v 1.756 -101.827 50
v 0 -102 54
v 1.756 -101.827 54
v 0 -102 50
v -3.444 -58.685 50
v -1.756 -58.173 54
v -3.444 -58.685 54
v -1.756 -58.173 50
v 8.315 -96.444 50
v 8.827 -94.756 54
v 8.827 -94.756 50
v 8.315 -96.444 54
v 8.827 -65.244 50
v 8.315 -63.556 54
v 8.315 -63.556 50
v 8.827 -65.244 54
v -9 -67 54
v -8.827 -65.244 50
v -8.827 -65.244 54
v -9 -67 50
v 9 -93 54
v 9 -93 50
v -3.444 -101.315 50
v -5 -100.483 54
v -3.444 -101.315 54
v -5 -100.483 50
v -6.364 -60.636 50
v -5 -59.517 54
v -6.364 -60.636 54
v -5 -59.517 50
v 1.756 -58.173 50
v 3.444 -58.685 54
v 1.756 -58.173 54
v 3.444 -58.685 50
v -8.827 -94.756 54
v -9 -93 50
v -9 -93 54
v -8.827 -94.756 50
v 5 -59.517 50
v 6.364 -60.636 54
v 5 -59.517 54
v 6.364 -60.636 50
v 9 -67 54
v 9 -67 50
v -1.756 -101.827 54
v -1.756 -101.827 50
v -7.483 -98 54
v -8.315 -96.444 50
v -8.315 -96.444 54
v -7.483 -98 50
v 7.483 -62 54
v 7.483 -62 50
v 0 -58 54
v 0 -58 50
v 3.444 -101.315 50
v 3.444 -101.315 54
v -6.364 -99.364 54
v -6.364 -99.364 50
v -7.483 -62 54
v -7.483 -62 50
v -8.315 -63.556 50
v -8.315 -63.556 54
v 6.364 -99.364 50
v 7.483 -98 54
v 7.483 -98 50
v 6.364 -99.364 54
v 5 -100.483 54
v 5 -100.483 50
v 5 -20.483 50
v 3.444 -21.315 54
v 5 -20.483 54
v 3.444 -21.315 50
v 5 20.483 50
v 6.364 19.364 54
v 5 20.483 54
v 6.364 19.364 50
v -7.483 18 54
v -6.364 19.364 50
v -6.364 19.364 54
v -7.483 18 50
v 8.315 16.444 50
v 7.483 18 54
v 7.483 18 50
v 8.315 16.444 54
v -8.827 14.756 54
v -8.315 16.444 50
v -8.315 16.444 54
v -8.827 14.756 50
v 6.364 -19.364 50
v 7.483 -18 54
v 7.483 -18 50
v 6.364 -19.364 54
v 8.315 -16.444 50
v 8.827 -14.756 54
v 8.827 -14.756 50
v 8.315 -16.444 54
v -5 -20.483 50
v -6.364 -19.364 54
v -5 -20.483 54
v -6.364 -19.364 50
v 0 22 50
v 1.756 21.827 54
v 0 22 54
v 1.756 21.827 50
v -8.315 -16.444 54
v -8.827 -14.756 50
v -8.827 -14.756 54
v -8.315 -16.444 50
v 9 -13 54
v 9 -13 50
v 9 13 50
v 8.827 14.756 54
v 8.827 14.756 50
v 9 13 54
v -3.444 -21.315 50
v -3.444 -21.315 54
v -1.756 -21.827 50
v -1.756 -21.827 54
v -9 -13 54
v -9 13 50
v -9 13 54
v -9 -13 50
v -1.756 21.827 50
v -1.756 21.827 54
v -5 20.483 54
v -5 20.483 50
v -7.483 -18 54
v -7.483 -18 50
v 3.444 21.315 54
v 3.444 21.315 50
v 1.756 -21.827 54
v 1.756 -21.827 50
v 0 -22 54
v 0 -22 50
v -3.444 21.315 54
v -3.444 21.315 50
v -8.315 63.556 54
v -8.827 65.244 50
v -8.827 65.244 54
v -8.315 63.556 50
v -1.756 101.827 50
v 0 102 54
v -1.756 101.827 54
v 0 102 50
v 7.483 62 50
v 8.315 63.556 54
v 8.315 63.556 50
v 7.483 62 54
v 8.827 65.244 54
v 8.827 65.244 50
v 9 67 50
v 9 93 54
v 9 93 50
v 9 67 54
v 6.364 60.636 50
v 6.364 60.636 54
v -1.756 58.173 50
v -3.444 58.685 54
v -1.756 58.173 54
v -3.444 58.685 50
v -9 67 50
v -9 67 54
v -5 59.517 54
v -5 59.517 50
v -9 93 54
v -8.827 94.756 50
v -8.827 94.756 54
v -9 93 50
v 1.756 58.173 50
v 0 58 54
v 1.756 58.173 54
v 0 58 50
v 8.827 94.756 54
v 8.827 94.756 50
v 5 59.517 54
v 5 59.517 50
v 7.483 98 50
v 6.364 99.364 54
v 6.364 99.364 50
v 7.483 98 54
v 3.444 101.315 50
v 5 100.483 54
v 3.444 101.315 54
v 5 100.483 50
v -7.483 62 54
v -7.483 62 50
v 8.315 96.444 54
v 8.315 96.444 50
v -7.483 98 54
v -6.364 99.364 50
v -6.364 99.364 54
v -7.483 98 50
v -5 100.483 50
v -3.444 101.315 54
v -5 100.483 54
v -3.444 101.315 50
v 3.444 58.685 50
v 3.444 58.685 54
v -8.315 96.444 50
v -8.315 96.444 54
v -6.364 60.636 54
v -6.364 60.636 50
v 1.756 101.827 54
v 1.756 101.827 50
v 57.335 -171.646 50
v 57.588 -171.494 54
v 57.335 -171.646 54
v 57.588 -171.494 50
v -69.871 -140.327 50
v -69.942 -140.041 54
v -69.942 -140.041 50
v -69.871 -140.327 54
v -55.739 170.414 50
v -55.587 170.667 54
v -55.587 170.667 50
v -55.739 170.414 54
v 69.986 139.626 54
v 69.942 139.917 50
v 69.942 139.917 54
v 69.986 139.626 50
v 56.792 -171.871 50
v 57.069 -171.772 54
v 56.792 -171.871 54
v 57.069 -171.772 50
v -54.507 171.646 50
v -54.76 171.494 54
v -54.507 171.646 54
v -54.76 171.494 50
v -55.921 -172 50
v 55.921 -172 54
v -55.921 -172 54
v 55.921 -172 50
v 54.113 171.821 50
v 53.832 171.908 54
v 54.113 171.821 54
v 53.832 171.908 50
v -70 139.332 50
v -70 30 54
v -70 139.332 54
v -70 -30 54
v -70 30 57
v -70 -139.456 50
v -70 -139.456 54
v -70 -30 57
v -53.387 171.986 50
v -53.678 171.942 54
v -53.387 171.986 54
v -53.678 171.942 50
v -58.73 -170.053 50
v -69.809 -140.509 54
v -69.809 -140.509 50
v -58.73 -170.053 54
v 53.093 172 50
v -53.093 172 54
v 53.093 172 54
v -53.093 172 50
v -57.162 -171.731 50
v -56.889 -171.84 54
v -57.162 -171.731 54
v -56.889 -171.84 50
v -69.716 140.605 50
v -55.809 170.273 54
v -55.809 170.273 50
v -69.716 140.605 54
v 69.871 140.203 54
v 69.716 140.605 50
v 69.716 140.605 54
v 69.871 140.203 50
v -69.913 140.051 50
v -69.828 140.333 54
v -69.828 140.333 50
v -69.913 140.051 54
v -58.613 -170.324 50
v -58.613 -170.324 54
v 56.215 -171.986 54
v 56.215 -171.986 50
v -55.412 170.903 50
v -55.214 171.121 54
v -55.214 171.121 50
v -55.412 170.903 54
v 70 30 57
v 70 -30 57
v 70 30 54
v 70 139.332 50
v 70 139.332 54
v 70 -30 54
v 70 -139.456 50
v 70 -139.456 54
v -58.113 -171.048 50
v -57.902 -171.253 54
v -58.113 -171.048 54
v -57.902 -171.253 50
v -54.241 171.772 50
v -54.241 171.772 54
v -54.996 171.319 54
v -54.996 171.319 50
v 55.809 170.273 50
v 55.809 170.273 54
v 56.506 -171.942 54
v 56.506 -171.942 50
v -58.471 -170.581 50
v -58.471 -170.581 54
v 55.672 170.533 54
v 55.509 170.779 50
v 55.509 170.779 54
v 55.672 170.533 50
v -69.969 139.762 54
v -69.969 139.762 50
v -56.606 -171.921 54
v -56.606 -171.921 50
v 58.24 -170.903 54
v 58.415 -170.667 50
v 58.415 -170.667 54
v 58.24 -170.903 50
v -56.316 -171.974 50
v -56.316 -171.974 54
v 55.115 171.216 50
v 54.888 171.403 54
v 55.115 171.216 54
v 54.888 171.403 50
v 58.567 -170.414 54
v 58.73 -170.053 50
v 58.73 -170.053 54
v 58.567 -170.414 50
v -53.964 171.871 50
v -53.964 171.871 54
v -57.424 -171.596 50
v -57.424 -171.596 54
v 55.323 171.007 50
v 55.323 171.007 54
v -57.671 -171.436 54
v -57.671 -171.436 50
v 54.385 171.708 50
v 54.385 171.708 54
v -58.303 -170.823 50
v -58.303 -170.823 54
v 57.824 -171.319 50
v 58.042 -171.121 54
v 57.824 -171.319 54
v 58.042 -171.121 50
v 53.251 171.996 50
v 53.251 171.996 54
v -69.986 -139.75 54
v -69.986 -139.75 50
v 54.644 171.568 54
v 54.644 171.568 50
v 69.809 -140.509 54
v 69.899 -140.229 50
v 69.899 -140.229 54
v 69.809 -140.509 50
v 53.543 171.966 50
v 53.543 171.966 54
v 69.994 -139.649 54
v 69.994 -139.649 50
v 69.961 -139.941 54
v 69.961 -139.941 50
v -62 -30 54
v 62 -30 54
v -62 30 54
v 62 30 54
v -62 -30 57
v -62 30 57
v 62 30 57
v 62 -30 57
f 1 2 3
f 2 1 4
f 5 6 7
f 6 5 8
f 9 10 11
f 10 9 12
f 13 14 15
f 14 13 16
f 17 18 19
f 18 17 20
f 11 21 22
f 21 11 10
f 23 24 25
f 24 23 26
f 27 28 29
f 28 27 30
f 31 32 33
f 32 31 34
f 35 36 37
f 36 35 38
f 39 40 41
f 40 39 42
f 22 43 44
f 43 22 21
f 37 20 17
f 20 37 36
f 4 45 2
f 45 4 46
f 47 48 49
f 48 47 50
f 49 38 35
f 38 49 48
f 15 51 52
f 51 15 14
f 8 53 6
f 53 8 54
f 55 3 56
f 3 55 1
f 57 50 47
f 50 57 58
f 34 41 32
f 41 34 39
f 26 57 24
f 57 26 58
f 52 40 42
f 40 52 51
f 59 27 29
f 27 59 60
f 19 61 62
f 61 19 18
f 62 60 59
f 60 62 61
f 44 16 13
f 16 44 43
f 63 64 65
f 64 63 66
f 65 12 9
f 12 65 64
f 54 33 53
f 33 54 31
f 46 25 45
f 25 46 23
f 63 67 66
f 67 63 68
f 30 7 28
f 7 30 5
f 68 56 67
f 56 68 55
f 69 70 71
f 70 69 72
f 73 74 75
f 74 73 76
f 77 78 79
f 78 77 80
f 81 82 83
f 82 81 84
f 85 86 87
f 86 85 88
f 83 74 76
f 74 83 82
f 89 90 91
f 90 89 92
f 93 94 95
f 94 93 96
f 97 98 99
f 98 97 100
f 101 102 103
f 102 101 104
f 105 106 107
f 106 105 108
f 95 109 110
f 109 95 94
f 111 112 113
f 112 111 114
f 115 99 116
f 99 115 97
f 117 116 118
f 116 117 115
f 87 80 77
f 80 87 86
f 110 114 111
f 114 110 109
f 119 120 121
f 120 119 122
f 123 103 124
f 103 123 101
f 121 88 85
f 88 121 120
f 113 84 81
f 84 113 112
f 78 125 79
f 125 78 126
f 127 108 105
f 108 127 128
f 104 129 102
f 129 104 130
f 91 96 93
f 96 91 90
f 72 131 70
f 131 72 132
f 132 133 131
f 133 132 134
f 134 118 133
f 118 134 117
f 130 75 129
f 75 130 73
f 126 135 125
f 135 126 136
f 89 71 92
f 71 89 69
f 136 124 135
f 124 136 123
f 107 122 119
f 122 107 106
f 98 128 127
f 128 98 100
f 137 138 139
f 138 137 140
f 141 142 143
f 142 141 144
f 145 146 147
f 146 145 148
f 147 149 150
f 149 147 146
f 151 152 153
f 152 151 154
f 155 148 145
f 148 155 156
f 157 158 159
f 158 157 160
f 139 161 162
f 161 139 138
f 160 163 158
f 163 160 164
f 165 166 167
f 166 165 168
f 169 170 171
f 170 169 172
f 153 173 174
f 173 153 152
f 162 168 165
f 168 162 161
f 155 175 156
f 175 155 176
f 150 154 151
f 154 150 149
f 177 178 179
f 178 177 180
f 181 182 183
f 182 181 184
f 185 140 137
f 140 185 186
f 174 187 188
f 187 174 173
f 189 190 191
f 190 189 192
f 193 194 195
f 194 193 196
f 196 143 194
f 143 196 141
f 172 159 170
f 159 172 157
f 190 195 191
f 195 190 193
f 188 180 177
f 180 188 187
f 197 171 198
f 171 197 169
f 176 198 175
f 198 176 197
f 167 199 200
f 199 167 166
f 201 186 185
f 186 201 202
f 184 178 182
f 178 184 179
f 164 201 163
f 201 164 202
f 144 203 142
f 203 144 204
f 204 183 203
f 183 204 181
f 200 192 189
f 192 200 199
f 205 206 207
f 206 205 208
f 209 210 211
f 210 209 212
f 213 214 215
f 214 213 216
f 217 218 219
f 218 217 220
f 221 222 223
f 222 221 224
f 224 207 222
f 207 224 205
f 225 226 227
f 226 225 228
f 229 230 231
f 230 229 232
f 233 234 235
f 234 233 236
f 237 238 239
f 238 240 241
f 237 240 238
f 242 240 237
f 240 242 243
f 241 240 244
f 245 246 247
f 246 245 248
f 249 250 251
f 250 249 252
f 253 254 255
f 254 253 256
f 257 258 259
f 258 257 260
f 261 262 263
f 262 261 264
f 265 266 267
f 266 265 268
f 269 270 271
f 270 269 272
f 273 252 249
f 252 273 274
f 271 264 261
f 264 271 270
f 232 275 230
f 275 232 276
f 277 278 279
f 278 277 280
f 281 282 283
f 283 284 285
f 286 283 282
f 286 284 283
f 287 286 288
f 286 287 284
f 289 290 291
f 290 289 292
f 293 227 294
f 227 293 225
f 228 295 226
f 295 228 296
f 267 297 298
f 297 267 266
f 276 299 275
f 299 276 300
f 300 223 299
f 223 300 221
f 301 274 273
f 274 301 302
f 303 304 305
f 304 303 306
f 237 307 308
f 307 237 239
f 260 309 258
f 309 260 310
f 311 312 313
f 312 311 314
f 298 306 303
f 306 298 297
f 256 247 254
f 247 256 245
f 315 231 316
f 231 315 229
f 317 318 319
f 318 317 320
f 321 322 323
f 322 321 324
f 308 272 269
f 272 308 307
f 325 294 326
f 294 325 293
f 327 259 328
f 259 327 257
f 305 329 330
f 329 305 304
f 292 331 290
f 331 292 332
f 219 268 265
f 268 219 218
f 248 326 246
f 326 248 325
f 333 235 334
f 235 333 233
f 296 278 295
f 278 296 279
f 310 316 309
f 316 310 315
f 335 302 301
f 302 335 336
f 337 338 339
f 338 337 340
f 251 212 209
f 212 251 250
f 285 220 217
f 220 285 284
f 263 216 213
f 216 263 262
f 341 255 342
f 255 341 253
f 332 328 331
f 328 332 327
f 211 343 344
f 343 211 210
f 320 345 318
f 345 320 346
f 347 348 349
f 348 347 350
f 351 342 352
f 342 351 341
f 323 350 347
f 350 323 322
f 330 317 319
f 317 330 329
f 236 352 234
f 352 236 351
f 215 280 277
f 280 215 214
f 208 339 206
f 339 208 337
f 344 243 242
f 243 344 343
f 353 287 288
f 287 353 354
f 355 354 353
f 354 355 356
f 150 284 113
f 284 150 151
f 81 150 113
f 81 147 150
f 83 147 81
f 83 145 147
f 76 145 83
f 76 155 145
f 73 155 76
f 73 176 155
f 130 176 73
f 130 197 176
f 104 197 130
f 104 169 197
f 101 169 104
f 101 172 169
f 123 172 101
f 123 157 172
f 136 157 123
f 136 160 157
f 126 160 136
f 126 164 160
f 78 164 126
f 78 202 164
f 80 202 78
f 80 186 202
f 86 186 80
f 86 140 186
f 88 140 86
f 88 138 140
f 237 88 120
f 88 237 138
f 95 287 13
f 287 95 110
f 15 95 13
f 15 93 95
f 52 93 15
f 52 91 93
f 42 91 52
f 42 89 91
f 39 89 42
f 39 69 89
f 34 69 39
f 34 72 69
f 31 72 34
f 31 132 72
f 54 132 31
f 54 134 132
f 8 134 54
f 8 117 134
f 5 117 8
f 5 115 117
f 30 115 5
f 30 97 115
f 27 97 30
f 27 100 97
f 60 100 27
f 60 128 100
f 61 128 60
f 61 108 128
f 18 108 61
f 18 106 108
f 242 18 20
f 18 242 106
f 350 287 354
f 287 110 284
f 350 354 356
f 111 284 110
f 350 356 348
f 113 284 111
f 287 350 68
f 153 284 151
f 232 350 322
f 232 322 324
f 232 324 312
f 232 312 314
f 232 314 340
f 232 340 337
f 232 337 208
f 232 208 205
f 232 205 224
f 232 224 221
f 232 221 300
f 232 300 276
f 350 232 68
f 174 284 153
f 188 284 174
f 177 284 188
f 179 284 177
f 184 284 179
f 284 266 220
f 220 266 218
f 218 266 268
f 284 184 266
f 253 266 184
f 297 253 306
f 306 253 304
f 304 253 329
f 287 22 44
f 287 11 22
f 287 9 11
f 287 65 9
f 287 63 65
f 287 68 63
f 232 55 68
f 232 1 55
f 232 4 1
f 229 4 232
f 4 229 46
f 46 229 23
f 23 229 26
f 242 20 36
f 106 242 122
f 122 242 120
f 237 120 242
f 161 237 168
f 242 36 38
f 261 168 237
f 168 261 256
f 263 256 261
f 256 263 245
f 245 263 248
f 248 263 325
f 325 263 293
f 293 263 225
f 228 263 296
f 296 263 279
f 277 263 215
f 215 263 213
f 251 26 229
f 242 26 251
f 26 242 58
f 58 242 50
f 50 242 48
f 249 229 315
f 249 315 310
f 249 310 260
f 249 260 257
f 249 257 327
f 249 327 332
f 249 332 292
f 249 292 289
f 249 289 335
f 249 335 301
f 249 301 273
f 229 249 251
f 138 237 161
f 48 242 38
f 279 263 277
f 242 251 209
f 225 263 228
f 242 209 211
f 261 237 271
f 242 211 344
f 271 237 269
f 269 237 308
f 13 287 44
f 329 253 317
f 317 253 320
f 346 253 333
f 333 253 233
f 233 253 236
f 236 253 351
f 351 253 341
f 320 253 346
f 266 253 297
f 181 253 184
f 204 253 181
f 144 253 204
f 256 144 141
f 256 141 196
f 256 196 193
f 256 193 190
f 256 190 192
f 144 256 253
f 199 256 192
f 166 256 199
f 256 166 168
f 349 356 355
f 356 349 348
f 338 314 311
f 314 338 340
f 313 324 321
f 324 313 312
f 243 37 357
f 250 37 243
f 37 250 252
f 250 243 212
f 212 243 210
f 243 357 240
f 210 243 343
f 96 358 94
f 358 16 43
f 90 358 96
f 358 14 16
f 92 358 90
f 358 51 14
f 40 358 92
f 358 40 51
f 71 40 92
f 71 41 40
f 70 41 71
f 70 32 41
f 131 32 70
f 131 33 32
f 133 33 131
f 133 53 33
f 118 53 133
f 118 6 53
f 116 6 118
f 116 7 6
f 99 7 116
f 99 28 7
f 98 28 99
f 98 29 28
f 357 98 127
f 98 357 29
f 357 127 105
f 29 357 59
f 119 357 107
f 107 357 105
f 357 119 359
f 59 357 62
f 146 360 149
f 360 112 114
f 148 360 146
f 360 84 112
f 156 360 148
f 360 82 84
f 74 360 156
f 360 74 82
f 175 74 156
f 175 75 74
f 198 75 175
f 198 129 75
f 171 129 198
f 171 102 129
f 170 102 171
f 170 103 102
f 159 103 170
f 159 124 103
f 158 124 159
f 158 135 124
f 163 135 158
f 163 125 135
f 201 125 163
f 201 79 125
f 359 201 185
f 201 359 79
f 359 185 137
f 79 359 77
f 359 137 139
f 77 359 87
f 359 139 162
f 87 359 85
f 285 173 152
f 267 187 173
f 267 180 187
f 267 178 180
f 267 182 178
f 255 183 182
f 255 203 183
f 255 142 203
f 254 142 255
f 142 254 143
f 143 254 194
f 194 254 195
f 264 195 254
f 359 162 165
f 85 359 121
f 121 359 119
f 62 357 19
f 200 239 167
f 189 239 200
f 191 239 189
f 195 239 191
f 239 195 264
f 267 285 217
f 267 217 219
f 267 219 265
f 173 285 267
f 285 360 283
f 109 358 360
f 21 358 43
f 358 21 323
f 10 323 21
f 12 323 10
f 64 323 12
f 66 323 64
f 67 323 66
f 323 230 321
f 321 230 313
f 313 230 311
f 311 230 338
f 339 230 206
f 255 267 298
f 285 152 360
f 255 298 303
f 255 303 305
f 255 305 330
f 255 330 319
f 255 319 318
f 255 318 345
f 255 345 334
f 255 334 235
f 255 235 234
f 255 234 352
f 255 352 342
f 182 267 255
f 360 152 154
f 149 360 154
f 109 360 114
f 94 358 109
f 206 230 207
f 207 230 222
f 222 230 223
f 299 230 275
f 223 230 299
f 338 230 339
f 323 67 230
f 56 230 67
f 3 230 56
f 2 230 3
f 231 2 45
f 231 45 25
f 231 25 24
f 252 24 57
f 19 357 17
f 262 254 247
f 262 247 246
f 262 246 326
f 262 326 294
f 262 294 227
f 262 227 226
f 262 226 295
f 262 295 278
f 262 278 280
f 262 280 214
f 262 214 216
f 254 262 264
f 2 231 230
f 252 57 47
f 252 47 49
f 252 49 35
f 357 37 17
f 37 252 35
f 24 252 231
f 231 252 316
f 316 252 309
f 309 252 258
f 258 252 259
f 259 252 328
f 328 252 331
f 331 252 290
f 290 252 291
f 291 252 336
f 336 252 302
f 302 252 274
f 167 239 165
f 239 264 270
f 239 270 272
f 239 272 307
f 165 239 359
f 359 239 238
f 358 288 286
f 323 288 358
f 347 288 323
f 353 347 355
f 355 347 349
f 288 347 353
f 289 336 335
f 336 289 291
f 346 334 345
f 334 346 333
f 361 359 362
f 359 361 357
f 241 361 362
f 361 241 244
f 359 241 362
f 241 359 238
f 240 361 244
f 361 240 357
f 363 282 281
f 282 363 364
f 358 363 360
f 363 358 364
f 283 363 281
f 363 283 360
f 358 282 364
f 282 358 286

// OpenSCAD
// file: ../lib.scad
/* =====================================================================
   공용 헬퍼 라이브러리 — params.scad 를 include 한 뒤 사용
   ===================================================================== */

/* 두 점을 잇는 둥근 끝 튜브(캡슐) — 용접 조인트처럼 자연스럽게 합쳐짐 */
module rod(p1, p2, od, fn=rod_fn)
    hull() {
        translate(p1) sphere(d=od, $fn=fn);
        translate(p2) sphere(d=od, $fn=fn);
    }

/* 로컬 +Z 축을 p1→p2 방향으로 정렬 (자식 배치용)
   Rz(φ)·Ry(θ)·ẑ = v̂  →  외부 Z 회전, 내부 Y 회전 순서 */
module orient(p1, p2) {
    v = p2 - p1;
    h = norm([v.x, v.y]);
    translate(p1)
        rotate([0, 0, atan2(v.y, v.x)])
        rotate([0, atan2(h, v.z), 0])
        children();
}

/* 모서리가 둥근 수직 판 (x=폭, y=길이, z0~z1) */
module plate(x, y, z0, z1, r=4, fn=32)
    hull()
        for (px = [-1, 1], py = [-1, 1])
            translate([px*(x/2 - r), py*(y/2 - r), z0])
                cylinder(r = r, h = z1 - z0, $fn = fn);

/* 코일오버 스프링 (로컬 +Z 축, z0~z1 구간에 링 n개) */
module coil(z0, z1, R = spring_R, t = spring_t, n = spring_n)
    for (i = [0 : n-1])
        translate([0, 0, z0 + i*(z1 - z0)/(n - 1)])
            rotate_extrude($fn = coil_fn)
                translate([R, 0]) circle(d = t, $fn = 16);

/* 쇼크업소버 (로컬 +Z 축, 하단 아이 z=0, 전장 L) */
module shock(L) {
    cylinder(d = shock_body_od, h = L*0.45, $fn = rod_fn);              // 댐퍼 바디
    translate([0, 0, L*0.45])
        cylinder(d = shock_rod_od, h = L*0.45 - 4, $fn = rod_fn);       // 로드
    coil(L*0.14, L*0.72);                                               // 스프링
    translate([0, 0, 2])   cube([10, 10, 4], center = true);            // 하단 아이 러그
    translate([0, 0, L-2]) cube([10, 10, 4], center = true);            // 상단 아이 러그
}
// file: ../params.scad
/* =====================================================================
   RC 오프로드 버기 (1:10) — 전역 파라미터
   단위: mm | 바닥면 z=0 | +Z 위 | +Y 전진 | +X 우측
   주요 치수는 이 파일 하나에서 일괄 수정 가능
   ===================================================================== */
$fn      = 64;    // 기본 곡면 해상도
rod_fn   = 48;    // 구조 튜브(캡슐) 해상도
wheel_fn = 96;    // 휠 원주 해상도
coil_fn  = 48;    // 쇼크 스프링 링 해상도

/* ------------------ 차량 기준 치수 ------------------ */
L_total   = 400;             // 전장
W_total   = 250;             // 전폭
WB        = 260;             // 휠베이스
wheel_dia = 110;             // 휠 외경(트레드 블록 포함)
wheel_r   = wheel_dia / 2;

/* ------------------ 섀시 플레이트 ------------------ */
chassis_z_bot   = 50;                        // 섀시 하면 높이(스키드 기준 지상고)
chassis_t       = 4;                         // 플레이트 두께
chassis_z_top   = chassis_z_bot + chassis_t;
chassis_hw      = 70;                        // 기본 반폭
chassis_taper_y = 140;                       // 앞뒤 테이퍼 시작 |y|
chassis_y_f     =  172;  chassis_hw_f = 55;  // 프런트 끝 (y, 반폭)
chassis_y_r     = -172;  chassis_hw_r = 58;  // 리어 끝   (y, 반폭)
rail_w = 8;  rail_h = 6;                     // 측면 강화 레일 단면

/* ------------------ 휠 / 타이어 ------------------ */
tire_w_f = 42;   hub_f_x = 104;   axle_f_y =  130;   // 프런트: 폭/허브x/액슬y
tire_w_r = 50;   hub_r_x = 100;   axle_r_y = -130;   // 리어(와이드)
hub_z    = wheel_r;                             // 허브 높이 = 접지
tire_carcass_r = 52.5;   // 카카스 외경 반지름(블록 돋음 전)
tire_bore_r    = 36;     // 타이어 내경 = 림 시트 반지름
tread_n     = 20;        // 트레드 블록 개수(행당)
tread_depth = 2.5;       // 블록 돋음 → 외경 110mm
tread_len   = 9;         // 블록 접선방향 길이
tread_w     = 8.5;       // 블록 축방향 폭
rim_wall = 3;  rim_gap = 0.4;  bead_t = 2.5;
hub_disc_r = 17;

/* ------------------ 롤 케이지 (6포인트) ------------------ */
tube_od   = 9;     // 메인 튜브 외경
tube_od_s = 7;     // 보조 튜브 외경
cage_fx = 58; cage_fy =  42;  cage_ft = [56,  38, 112]; // 프런트 후프 발(x,y)→상단
cage_mx = 58; cage_my = -48;  cage_mt = [55, -48, 128]; // 메인 후프
cage_sx = 52; cage_sy = -98;                            // 리어 스테이 발
foot_t = 5;                                             // 발판 두께

/* ------------------ 서스펜션 (더블 위시본) ------------------ */
arm_od     = 7;      // A-arm 튜브 외경
bush_od    = 10;     // 피벗 부싱 외경
lwr_bush_x = 75.5;   // 로어 부싱 x(섀시 측면 외측)
lwr_dy     = 12;     // 로어 부싱 y 오프셋(액슬 기준)
lwr_z      = 50;     // 로어 아암 높이
knk_f      = 100;    // 프런트 너클 x
knk_r      = 96;     // 리어 너클 x
upr_piv_x  = 56;     // 어퍼 피벗 타워 x
upr_z      = 72;     // 어퍼 아암 높이
tower_fx = 47; tower_fy =  107; tower_top = 99;  // 프런트 쇼크 타워
tower_rx = 47; tower_ry = -151;                  // 리어 쇼크 타워
shock_body_od = 9;  shock_rod_od = 3.5;
spring_R = 6.5;  spring_t = 2.0;  spring_n = 6;

/* ------------------ 파워트레인 ------------------ */
eng_hw=35;  eng_yf=-68;   eng_yr=-110;  eng_top=88;         // 엔진 블록(yf=앞, yr=뒤)
head_hw=30; head_yf=-84;  head_yr=-112;  head_top=100;      // 실린더 헤드
rad_hw=50;  rad_y0=155;   rad_y1=165;  rad_z0=77; rad_z1=109; // 라디에이터

/* ------------------ 공통 ------------------ */
gap = 0.4;                    // 부품 간 결합 클리어런스
z0  = chassis_z_top + gap;    // 섀시 위에 올라가는 부품의 기준 하면
// main file
/* 01. 섀시 플레이트(하부) — 알루미늄 스타일 스켈레톤 플레이트 */
include <../params.scad>
include <../lib.scad>

module part_chassis() {
    difference() {
        // 메인 플레이트 (앞뒤 테이퍼 + 모서리 라운딩)
        translate([0, 0, chassis_z_bot])
            linear_extrude(chassis_t)
                offset(r = 3) offset(delta = -3)
                    polygon([
                        [-chassis_hw_r, chassis_y_r],
                        [ chassis_hw_r, chassis_y_r],
                        [ chassis_hw,  -chassis_taper_y],
                        [ chassis_hw,   chassis_taper_y],
                        [ chassis_hw_f, chassis_y_f],
                        [-chassis_hw_f, chassis_y_f],
                        [-chassis_hw,   chassis_taper_y],
                        [-chassis_hw,  -chassis_taper_y],
                    ]);
        // 경량화 오픈 (장착부를 피해 3개)
        for (yc = [-80, 0, 80])
            hull()
                for (dy = [-13, 13])
                    translate([0, yc + dy, chassis_z_bot - 1])
                        cylinder(r = 9, h = chassis_t + 2, $fn = 32);
    }
    // 측면 강화 레일 (센터 구간만 — 케이지 발판/바디 패널과 간섭 회피)
    for (s = [-1, 1])
        translate([s*(chassis_hw - rail_w/2), 0, chassis_z_top])
            cube([rail_w, 60, rail_h], center = true);
}

part_chassis();
